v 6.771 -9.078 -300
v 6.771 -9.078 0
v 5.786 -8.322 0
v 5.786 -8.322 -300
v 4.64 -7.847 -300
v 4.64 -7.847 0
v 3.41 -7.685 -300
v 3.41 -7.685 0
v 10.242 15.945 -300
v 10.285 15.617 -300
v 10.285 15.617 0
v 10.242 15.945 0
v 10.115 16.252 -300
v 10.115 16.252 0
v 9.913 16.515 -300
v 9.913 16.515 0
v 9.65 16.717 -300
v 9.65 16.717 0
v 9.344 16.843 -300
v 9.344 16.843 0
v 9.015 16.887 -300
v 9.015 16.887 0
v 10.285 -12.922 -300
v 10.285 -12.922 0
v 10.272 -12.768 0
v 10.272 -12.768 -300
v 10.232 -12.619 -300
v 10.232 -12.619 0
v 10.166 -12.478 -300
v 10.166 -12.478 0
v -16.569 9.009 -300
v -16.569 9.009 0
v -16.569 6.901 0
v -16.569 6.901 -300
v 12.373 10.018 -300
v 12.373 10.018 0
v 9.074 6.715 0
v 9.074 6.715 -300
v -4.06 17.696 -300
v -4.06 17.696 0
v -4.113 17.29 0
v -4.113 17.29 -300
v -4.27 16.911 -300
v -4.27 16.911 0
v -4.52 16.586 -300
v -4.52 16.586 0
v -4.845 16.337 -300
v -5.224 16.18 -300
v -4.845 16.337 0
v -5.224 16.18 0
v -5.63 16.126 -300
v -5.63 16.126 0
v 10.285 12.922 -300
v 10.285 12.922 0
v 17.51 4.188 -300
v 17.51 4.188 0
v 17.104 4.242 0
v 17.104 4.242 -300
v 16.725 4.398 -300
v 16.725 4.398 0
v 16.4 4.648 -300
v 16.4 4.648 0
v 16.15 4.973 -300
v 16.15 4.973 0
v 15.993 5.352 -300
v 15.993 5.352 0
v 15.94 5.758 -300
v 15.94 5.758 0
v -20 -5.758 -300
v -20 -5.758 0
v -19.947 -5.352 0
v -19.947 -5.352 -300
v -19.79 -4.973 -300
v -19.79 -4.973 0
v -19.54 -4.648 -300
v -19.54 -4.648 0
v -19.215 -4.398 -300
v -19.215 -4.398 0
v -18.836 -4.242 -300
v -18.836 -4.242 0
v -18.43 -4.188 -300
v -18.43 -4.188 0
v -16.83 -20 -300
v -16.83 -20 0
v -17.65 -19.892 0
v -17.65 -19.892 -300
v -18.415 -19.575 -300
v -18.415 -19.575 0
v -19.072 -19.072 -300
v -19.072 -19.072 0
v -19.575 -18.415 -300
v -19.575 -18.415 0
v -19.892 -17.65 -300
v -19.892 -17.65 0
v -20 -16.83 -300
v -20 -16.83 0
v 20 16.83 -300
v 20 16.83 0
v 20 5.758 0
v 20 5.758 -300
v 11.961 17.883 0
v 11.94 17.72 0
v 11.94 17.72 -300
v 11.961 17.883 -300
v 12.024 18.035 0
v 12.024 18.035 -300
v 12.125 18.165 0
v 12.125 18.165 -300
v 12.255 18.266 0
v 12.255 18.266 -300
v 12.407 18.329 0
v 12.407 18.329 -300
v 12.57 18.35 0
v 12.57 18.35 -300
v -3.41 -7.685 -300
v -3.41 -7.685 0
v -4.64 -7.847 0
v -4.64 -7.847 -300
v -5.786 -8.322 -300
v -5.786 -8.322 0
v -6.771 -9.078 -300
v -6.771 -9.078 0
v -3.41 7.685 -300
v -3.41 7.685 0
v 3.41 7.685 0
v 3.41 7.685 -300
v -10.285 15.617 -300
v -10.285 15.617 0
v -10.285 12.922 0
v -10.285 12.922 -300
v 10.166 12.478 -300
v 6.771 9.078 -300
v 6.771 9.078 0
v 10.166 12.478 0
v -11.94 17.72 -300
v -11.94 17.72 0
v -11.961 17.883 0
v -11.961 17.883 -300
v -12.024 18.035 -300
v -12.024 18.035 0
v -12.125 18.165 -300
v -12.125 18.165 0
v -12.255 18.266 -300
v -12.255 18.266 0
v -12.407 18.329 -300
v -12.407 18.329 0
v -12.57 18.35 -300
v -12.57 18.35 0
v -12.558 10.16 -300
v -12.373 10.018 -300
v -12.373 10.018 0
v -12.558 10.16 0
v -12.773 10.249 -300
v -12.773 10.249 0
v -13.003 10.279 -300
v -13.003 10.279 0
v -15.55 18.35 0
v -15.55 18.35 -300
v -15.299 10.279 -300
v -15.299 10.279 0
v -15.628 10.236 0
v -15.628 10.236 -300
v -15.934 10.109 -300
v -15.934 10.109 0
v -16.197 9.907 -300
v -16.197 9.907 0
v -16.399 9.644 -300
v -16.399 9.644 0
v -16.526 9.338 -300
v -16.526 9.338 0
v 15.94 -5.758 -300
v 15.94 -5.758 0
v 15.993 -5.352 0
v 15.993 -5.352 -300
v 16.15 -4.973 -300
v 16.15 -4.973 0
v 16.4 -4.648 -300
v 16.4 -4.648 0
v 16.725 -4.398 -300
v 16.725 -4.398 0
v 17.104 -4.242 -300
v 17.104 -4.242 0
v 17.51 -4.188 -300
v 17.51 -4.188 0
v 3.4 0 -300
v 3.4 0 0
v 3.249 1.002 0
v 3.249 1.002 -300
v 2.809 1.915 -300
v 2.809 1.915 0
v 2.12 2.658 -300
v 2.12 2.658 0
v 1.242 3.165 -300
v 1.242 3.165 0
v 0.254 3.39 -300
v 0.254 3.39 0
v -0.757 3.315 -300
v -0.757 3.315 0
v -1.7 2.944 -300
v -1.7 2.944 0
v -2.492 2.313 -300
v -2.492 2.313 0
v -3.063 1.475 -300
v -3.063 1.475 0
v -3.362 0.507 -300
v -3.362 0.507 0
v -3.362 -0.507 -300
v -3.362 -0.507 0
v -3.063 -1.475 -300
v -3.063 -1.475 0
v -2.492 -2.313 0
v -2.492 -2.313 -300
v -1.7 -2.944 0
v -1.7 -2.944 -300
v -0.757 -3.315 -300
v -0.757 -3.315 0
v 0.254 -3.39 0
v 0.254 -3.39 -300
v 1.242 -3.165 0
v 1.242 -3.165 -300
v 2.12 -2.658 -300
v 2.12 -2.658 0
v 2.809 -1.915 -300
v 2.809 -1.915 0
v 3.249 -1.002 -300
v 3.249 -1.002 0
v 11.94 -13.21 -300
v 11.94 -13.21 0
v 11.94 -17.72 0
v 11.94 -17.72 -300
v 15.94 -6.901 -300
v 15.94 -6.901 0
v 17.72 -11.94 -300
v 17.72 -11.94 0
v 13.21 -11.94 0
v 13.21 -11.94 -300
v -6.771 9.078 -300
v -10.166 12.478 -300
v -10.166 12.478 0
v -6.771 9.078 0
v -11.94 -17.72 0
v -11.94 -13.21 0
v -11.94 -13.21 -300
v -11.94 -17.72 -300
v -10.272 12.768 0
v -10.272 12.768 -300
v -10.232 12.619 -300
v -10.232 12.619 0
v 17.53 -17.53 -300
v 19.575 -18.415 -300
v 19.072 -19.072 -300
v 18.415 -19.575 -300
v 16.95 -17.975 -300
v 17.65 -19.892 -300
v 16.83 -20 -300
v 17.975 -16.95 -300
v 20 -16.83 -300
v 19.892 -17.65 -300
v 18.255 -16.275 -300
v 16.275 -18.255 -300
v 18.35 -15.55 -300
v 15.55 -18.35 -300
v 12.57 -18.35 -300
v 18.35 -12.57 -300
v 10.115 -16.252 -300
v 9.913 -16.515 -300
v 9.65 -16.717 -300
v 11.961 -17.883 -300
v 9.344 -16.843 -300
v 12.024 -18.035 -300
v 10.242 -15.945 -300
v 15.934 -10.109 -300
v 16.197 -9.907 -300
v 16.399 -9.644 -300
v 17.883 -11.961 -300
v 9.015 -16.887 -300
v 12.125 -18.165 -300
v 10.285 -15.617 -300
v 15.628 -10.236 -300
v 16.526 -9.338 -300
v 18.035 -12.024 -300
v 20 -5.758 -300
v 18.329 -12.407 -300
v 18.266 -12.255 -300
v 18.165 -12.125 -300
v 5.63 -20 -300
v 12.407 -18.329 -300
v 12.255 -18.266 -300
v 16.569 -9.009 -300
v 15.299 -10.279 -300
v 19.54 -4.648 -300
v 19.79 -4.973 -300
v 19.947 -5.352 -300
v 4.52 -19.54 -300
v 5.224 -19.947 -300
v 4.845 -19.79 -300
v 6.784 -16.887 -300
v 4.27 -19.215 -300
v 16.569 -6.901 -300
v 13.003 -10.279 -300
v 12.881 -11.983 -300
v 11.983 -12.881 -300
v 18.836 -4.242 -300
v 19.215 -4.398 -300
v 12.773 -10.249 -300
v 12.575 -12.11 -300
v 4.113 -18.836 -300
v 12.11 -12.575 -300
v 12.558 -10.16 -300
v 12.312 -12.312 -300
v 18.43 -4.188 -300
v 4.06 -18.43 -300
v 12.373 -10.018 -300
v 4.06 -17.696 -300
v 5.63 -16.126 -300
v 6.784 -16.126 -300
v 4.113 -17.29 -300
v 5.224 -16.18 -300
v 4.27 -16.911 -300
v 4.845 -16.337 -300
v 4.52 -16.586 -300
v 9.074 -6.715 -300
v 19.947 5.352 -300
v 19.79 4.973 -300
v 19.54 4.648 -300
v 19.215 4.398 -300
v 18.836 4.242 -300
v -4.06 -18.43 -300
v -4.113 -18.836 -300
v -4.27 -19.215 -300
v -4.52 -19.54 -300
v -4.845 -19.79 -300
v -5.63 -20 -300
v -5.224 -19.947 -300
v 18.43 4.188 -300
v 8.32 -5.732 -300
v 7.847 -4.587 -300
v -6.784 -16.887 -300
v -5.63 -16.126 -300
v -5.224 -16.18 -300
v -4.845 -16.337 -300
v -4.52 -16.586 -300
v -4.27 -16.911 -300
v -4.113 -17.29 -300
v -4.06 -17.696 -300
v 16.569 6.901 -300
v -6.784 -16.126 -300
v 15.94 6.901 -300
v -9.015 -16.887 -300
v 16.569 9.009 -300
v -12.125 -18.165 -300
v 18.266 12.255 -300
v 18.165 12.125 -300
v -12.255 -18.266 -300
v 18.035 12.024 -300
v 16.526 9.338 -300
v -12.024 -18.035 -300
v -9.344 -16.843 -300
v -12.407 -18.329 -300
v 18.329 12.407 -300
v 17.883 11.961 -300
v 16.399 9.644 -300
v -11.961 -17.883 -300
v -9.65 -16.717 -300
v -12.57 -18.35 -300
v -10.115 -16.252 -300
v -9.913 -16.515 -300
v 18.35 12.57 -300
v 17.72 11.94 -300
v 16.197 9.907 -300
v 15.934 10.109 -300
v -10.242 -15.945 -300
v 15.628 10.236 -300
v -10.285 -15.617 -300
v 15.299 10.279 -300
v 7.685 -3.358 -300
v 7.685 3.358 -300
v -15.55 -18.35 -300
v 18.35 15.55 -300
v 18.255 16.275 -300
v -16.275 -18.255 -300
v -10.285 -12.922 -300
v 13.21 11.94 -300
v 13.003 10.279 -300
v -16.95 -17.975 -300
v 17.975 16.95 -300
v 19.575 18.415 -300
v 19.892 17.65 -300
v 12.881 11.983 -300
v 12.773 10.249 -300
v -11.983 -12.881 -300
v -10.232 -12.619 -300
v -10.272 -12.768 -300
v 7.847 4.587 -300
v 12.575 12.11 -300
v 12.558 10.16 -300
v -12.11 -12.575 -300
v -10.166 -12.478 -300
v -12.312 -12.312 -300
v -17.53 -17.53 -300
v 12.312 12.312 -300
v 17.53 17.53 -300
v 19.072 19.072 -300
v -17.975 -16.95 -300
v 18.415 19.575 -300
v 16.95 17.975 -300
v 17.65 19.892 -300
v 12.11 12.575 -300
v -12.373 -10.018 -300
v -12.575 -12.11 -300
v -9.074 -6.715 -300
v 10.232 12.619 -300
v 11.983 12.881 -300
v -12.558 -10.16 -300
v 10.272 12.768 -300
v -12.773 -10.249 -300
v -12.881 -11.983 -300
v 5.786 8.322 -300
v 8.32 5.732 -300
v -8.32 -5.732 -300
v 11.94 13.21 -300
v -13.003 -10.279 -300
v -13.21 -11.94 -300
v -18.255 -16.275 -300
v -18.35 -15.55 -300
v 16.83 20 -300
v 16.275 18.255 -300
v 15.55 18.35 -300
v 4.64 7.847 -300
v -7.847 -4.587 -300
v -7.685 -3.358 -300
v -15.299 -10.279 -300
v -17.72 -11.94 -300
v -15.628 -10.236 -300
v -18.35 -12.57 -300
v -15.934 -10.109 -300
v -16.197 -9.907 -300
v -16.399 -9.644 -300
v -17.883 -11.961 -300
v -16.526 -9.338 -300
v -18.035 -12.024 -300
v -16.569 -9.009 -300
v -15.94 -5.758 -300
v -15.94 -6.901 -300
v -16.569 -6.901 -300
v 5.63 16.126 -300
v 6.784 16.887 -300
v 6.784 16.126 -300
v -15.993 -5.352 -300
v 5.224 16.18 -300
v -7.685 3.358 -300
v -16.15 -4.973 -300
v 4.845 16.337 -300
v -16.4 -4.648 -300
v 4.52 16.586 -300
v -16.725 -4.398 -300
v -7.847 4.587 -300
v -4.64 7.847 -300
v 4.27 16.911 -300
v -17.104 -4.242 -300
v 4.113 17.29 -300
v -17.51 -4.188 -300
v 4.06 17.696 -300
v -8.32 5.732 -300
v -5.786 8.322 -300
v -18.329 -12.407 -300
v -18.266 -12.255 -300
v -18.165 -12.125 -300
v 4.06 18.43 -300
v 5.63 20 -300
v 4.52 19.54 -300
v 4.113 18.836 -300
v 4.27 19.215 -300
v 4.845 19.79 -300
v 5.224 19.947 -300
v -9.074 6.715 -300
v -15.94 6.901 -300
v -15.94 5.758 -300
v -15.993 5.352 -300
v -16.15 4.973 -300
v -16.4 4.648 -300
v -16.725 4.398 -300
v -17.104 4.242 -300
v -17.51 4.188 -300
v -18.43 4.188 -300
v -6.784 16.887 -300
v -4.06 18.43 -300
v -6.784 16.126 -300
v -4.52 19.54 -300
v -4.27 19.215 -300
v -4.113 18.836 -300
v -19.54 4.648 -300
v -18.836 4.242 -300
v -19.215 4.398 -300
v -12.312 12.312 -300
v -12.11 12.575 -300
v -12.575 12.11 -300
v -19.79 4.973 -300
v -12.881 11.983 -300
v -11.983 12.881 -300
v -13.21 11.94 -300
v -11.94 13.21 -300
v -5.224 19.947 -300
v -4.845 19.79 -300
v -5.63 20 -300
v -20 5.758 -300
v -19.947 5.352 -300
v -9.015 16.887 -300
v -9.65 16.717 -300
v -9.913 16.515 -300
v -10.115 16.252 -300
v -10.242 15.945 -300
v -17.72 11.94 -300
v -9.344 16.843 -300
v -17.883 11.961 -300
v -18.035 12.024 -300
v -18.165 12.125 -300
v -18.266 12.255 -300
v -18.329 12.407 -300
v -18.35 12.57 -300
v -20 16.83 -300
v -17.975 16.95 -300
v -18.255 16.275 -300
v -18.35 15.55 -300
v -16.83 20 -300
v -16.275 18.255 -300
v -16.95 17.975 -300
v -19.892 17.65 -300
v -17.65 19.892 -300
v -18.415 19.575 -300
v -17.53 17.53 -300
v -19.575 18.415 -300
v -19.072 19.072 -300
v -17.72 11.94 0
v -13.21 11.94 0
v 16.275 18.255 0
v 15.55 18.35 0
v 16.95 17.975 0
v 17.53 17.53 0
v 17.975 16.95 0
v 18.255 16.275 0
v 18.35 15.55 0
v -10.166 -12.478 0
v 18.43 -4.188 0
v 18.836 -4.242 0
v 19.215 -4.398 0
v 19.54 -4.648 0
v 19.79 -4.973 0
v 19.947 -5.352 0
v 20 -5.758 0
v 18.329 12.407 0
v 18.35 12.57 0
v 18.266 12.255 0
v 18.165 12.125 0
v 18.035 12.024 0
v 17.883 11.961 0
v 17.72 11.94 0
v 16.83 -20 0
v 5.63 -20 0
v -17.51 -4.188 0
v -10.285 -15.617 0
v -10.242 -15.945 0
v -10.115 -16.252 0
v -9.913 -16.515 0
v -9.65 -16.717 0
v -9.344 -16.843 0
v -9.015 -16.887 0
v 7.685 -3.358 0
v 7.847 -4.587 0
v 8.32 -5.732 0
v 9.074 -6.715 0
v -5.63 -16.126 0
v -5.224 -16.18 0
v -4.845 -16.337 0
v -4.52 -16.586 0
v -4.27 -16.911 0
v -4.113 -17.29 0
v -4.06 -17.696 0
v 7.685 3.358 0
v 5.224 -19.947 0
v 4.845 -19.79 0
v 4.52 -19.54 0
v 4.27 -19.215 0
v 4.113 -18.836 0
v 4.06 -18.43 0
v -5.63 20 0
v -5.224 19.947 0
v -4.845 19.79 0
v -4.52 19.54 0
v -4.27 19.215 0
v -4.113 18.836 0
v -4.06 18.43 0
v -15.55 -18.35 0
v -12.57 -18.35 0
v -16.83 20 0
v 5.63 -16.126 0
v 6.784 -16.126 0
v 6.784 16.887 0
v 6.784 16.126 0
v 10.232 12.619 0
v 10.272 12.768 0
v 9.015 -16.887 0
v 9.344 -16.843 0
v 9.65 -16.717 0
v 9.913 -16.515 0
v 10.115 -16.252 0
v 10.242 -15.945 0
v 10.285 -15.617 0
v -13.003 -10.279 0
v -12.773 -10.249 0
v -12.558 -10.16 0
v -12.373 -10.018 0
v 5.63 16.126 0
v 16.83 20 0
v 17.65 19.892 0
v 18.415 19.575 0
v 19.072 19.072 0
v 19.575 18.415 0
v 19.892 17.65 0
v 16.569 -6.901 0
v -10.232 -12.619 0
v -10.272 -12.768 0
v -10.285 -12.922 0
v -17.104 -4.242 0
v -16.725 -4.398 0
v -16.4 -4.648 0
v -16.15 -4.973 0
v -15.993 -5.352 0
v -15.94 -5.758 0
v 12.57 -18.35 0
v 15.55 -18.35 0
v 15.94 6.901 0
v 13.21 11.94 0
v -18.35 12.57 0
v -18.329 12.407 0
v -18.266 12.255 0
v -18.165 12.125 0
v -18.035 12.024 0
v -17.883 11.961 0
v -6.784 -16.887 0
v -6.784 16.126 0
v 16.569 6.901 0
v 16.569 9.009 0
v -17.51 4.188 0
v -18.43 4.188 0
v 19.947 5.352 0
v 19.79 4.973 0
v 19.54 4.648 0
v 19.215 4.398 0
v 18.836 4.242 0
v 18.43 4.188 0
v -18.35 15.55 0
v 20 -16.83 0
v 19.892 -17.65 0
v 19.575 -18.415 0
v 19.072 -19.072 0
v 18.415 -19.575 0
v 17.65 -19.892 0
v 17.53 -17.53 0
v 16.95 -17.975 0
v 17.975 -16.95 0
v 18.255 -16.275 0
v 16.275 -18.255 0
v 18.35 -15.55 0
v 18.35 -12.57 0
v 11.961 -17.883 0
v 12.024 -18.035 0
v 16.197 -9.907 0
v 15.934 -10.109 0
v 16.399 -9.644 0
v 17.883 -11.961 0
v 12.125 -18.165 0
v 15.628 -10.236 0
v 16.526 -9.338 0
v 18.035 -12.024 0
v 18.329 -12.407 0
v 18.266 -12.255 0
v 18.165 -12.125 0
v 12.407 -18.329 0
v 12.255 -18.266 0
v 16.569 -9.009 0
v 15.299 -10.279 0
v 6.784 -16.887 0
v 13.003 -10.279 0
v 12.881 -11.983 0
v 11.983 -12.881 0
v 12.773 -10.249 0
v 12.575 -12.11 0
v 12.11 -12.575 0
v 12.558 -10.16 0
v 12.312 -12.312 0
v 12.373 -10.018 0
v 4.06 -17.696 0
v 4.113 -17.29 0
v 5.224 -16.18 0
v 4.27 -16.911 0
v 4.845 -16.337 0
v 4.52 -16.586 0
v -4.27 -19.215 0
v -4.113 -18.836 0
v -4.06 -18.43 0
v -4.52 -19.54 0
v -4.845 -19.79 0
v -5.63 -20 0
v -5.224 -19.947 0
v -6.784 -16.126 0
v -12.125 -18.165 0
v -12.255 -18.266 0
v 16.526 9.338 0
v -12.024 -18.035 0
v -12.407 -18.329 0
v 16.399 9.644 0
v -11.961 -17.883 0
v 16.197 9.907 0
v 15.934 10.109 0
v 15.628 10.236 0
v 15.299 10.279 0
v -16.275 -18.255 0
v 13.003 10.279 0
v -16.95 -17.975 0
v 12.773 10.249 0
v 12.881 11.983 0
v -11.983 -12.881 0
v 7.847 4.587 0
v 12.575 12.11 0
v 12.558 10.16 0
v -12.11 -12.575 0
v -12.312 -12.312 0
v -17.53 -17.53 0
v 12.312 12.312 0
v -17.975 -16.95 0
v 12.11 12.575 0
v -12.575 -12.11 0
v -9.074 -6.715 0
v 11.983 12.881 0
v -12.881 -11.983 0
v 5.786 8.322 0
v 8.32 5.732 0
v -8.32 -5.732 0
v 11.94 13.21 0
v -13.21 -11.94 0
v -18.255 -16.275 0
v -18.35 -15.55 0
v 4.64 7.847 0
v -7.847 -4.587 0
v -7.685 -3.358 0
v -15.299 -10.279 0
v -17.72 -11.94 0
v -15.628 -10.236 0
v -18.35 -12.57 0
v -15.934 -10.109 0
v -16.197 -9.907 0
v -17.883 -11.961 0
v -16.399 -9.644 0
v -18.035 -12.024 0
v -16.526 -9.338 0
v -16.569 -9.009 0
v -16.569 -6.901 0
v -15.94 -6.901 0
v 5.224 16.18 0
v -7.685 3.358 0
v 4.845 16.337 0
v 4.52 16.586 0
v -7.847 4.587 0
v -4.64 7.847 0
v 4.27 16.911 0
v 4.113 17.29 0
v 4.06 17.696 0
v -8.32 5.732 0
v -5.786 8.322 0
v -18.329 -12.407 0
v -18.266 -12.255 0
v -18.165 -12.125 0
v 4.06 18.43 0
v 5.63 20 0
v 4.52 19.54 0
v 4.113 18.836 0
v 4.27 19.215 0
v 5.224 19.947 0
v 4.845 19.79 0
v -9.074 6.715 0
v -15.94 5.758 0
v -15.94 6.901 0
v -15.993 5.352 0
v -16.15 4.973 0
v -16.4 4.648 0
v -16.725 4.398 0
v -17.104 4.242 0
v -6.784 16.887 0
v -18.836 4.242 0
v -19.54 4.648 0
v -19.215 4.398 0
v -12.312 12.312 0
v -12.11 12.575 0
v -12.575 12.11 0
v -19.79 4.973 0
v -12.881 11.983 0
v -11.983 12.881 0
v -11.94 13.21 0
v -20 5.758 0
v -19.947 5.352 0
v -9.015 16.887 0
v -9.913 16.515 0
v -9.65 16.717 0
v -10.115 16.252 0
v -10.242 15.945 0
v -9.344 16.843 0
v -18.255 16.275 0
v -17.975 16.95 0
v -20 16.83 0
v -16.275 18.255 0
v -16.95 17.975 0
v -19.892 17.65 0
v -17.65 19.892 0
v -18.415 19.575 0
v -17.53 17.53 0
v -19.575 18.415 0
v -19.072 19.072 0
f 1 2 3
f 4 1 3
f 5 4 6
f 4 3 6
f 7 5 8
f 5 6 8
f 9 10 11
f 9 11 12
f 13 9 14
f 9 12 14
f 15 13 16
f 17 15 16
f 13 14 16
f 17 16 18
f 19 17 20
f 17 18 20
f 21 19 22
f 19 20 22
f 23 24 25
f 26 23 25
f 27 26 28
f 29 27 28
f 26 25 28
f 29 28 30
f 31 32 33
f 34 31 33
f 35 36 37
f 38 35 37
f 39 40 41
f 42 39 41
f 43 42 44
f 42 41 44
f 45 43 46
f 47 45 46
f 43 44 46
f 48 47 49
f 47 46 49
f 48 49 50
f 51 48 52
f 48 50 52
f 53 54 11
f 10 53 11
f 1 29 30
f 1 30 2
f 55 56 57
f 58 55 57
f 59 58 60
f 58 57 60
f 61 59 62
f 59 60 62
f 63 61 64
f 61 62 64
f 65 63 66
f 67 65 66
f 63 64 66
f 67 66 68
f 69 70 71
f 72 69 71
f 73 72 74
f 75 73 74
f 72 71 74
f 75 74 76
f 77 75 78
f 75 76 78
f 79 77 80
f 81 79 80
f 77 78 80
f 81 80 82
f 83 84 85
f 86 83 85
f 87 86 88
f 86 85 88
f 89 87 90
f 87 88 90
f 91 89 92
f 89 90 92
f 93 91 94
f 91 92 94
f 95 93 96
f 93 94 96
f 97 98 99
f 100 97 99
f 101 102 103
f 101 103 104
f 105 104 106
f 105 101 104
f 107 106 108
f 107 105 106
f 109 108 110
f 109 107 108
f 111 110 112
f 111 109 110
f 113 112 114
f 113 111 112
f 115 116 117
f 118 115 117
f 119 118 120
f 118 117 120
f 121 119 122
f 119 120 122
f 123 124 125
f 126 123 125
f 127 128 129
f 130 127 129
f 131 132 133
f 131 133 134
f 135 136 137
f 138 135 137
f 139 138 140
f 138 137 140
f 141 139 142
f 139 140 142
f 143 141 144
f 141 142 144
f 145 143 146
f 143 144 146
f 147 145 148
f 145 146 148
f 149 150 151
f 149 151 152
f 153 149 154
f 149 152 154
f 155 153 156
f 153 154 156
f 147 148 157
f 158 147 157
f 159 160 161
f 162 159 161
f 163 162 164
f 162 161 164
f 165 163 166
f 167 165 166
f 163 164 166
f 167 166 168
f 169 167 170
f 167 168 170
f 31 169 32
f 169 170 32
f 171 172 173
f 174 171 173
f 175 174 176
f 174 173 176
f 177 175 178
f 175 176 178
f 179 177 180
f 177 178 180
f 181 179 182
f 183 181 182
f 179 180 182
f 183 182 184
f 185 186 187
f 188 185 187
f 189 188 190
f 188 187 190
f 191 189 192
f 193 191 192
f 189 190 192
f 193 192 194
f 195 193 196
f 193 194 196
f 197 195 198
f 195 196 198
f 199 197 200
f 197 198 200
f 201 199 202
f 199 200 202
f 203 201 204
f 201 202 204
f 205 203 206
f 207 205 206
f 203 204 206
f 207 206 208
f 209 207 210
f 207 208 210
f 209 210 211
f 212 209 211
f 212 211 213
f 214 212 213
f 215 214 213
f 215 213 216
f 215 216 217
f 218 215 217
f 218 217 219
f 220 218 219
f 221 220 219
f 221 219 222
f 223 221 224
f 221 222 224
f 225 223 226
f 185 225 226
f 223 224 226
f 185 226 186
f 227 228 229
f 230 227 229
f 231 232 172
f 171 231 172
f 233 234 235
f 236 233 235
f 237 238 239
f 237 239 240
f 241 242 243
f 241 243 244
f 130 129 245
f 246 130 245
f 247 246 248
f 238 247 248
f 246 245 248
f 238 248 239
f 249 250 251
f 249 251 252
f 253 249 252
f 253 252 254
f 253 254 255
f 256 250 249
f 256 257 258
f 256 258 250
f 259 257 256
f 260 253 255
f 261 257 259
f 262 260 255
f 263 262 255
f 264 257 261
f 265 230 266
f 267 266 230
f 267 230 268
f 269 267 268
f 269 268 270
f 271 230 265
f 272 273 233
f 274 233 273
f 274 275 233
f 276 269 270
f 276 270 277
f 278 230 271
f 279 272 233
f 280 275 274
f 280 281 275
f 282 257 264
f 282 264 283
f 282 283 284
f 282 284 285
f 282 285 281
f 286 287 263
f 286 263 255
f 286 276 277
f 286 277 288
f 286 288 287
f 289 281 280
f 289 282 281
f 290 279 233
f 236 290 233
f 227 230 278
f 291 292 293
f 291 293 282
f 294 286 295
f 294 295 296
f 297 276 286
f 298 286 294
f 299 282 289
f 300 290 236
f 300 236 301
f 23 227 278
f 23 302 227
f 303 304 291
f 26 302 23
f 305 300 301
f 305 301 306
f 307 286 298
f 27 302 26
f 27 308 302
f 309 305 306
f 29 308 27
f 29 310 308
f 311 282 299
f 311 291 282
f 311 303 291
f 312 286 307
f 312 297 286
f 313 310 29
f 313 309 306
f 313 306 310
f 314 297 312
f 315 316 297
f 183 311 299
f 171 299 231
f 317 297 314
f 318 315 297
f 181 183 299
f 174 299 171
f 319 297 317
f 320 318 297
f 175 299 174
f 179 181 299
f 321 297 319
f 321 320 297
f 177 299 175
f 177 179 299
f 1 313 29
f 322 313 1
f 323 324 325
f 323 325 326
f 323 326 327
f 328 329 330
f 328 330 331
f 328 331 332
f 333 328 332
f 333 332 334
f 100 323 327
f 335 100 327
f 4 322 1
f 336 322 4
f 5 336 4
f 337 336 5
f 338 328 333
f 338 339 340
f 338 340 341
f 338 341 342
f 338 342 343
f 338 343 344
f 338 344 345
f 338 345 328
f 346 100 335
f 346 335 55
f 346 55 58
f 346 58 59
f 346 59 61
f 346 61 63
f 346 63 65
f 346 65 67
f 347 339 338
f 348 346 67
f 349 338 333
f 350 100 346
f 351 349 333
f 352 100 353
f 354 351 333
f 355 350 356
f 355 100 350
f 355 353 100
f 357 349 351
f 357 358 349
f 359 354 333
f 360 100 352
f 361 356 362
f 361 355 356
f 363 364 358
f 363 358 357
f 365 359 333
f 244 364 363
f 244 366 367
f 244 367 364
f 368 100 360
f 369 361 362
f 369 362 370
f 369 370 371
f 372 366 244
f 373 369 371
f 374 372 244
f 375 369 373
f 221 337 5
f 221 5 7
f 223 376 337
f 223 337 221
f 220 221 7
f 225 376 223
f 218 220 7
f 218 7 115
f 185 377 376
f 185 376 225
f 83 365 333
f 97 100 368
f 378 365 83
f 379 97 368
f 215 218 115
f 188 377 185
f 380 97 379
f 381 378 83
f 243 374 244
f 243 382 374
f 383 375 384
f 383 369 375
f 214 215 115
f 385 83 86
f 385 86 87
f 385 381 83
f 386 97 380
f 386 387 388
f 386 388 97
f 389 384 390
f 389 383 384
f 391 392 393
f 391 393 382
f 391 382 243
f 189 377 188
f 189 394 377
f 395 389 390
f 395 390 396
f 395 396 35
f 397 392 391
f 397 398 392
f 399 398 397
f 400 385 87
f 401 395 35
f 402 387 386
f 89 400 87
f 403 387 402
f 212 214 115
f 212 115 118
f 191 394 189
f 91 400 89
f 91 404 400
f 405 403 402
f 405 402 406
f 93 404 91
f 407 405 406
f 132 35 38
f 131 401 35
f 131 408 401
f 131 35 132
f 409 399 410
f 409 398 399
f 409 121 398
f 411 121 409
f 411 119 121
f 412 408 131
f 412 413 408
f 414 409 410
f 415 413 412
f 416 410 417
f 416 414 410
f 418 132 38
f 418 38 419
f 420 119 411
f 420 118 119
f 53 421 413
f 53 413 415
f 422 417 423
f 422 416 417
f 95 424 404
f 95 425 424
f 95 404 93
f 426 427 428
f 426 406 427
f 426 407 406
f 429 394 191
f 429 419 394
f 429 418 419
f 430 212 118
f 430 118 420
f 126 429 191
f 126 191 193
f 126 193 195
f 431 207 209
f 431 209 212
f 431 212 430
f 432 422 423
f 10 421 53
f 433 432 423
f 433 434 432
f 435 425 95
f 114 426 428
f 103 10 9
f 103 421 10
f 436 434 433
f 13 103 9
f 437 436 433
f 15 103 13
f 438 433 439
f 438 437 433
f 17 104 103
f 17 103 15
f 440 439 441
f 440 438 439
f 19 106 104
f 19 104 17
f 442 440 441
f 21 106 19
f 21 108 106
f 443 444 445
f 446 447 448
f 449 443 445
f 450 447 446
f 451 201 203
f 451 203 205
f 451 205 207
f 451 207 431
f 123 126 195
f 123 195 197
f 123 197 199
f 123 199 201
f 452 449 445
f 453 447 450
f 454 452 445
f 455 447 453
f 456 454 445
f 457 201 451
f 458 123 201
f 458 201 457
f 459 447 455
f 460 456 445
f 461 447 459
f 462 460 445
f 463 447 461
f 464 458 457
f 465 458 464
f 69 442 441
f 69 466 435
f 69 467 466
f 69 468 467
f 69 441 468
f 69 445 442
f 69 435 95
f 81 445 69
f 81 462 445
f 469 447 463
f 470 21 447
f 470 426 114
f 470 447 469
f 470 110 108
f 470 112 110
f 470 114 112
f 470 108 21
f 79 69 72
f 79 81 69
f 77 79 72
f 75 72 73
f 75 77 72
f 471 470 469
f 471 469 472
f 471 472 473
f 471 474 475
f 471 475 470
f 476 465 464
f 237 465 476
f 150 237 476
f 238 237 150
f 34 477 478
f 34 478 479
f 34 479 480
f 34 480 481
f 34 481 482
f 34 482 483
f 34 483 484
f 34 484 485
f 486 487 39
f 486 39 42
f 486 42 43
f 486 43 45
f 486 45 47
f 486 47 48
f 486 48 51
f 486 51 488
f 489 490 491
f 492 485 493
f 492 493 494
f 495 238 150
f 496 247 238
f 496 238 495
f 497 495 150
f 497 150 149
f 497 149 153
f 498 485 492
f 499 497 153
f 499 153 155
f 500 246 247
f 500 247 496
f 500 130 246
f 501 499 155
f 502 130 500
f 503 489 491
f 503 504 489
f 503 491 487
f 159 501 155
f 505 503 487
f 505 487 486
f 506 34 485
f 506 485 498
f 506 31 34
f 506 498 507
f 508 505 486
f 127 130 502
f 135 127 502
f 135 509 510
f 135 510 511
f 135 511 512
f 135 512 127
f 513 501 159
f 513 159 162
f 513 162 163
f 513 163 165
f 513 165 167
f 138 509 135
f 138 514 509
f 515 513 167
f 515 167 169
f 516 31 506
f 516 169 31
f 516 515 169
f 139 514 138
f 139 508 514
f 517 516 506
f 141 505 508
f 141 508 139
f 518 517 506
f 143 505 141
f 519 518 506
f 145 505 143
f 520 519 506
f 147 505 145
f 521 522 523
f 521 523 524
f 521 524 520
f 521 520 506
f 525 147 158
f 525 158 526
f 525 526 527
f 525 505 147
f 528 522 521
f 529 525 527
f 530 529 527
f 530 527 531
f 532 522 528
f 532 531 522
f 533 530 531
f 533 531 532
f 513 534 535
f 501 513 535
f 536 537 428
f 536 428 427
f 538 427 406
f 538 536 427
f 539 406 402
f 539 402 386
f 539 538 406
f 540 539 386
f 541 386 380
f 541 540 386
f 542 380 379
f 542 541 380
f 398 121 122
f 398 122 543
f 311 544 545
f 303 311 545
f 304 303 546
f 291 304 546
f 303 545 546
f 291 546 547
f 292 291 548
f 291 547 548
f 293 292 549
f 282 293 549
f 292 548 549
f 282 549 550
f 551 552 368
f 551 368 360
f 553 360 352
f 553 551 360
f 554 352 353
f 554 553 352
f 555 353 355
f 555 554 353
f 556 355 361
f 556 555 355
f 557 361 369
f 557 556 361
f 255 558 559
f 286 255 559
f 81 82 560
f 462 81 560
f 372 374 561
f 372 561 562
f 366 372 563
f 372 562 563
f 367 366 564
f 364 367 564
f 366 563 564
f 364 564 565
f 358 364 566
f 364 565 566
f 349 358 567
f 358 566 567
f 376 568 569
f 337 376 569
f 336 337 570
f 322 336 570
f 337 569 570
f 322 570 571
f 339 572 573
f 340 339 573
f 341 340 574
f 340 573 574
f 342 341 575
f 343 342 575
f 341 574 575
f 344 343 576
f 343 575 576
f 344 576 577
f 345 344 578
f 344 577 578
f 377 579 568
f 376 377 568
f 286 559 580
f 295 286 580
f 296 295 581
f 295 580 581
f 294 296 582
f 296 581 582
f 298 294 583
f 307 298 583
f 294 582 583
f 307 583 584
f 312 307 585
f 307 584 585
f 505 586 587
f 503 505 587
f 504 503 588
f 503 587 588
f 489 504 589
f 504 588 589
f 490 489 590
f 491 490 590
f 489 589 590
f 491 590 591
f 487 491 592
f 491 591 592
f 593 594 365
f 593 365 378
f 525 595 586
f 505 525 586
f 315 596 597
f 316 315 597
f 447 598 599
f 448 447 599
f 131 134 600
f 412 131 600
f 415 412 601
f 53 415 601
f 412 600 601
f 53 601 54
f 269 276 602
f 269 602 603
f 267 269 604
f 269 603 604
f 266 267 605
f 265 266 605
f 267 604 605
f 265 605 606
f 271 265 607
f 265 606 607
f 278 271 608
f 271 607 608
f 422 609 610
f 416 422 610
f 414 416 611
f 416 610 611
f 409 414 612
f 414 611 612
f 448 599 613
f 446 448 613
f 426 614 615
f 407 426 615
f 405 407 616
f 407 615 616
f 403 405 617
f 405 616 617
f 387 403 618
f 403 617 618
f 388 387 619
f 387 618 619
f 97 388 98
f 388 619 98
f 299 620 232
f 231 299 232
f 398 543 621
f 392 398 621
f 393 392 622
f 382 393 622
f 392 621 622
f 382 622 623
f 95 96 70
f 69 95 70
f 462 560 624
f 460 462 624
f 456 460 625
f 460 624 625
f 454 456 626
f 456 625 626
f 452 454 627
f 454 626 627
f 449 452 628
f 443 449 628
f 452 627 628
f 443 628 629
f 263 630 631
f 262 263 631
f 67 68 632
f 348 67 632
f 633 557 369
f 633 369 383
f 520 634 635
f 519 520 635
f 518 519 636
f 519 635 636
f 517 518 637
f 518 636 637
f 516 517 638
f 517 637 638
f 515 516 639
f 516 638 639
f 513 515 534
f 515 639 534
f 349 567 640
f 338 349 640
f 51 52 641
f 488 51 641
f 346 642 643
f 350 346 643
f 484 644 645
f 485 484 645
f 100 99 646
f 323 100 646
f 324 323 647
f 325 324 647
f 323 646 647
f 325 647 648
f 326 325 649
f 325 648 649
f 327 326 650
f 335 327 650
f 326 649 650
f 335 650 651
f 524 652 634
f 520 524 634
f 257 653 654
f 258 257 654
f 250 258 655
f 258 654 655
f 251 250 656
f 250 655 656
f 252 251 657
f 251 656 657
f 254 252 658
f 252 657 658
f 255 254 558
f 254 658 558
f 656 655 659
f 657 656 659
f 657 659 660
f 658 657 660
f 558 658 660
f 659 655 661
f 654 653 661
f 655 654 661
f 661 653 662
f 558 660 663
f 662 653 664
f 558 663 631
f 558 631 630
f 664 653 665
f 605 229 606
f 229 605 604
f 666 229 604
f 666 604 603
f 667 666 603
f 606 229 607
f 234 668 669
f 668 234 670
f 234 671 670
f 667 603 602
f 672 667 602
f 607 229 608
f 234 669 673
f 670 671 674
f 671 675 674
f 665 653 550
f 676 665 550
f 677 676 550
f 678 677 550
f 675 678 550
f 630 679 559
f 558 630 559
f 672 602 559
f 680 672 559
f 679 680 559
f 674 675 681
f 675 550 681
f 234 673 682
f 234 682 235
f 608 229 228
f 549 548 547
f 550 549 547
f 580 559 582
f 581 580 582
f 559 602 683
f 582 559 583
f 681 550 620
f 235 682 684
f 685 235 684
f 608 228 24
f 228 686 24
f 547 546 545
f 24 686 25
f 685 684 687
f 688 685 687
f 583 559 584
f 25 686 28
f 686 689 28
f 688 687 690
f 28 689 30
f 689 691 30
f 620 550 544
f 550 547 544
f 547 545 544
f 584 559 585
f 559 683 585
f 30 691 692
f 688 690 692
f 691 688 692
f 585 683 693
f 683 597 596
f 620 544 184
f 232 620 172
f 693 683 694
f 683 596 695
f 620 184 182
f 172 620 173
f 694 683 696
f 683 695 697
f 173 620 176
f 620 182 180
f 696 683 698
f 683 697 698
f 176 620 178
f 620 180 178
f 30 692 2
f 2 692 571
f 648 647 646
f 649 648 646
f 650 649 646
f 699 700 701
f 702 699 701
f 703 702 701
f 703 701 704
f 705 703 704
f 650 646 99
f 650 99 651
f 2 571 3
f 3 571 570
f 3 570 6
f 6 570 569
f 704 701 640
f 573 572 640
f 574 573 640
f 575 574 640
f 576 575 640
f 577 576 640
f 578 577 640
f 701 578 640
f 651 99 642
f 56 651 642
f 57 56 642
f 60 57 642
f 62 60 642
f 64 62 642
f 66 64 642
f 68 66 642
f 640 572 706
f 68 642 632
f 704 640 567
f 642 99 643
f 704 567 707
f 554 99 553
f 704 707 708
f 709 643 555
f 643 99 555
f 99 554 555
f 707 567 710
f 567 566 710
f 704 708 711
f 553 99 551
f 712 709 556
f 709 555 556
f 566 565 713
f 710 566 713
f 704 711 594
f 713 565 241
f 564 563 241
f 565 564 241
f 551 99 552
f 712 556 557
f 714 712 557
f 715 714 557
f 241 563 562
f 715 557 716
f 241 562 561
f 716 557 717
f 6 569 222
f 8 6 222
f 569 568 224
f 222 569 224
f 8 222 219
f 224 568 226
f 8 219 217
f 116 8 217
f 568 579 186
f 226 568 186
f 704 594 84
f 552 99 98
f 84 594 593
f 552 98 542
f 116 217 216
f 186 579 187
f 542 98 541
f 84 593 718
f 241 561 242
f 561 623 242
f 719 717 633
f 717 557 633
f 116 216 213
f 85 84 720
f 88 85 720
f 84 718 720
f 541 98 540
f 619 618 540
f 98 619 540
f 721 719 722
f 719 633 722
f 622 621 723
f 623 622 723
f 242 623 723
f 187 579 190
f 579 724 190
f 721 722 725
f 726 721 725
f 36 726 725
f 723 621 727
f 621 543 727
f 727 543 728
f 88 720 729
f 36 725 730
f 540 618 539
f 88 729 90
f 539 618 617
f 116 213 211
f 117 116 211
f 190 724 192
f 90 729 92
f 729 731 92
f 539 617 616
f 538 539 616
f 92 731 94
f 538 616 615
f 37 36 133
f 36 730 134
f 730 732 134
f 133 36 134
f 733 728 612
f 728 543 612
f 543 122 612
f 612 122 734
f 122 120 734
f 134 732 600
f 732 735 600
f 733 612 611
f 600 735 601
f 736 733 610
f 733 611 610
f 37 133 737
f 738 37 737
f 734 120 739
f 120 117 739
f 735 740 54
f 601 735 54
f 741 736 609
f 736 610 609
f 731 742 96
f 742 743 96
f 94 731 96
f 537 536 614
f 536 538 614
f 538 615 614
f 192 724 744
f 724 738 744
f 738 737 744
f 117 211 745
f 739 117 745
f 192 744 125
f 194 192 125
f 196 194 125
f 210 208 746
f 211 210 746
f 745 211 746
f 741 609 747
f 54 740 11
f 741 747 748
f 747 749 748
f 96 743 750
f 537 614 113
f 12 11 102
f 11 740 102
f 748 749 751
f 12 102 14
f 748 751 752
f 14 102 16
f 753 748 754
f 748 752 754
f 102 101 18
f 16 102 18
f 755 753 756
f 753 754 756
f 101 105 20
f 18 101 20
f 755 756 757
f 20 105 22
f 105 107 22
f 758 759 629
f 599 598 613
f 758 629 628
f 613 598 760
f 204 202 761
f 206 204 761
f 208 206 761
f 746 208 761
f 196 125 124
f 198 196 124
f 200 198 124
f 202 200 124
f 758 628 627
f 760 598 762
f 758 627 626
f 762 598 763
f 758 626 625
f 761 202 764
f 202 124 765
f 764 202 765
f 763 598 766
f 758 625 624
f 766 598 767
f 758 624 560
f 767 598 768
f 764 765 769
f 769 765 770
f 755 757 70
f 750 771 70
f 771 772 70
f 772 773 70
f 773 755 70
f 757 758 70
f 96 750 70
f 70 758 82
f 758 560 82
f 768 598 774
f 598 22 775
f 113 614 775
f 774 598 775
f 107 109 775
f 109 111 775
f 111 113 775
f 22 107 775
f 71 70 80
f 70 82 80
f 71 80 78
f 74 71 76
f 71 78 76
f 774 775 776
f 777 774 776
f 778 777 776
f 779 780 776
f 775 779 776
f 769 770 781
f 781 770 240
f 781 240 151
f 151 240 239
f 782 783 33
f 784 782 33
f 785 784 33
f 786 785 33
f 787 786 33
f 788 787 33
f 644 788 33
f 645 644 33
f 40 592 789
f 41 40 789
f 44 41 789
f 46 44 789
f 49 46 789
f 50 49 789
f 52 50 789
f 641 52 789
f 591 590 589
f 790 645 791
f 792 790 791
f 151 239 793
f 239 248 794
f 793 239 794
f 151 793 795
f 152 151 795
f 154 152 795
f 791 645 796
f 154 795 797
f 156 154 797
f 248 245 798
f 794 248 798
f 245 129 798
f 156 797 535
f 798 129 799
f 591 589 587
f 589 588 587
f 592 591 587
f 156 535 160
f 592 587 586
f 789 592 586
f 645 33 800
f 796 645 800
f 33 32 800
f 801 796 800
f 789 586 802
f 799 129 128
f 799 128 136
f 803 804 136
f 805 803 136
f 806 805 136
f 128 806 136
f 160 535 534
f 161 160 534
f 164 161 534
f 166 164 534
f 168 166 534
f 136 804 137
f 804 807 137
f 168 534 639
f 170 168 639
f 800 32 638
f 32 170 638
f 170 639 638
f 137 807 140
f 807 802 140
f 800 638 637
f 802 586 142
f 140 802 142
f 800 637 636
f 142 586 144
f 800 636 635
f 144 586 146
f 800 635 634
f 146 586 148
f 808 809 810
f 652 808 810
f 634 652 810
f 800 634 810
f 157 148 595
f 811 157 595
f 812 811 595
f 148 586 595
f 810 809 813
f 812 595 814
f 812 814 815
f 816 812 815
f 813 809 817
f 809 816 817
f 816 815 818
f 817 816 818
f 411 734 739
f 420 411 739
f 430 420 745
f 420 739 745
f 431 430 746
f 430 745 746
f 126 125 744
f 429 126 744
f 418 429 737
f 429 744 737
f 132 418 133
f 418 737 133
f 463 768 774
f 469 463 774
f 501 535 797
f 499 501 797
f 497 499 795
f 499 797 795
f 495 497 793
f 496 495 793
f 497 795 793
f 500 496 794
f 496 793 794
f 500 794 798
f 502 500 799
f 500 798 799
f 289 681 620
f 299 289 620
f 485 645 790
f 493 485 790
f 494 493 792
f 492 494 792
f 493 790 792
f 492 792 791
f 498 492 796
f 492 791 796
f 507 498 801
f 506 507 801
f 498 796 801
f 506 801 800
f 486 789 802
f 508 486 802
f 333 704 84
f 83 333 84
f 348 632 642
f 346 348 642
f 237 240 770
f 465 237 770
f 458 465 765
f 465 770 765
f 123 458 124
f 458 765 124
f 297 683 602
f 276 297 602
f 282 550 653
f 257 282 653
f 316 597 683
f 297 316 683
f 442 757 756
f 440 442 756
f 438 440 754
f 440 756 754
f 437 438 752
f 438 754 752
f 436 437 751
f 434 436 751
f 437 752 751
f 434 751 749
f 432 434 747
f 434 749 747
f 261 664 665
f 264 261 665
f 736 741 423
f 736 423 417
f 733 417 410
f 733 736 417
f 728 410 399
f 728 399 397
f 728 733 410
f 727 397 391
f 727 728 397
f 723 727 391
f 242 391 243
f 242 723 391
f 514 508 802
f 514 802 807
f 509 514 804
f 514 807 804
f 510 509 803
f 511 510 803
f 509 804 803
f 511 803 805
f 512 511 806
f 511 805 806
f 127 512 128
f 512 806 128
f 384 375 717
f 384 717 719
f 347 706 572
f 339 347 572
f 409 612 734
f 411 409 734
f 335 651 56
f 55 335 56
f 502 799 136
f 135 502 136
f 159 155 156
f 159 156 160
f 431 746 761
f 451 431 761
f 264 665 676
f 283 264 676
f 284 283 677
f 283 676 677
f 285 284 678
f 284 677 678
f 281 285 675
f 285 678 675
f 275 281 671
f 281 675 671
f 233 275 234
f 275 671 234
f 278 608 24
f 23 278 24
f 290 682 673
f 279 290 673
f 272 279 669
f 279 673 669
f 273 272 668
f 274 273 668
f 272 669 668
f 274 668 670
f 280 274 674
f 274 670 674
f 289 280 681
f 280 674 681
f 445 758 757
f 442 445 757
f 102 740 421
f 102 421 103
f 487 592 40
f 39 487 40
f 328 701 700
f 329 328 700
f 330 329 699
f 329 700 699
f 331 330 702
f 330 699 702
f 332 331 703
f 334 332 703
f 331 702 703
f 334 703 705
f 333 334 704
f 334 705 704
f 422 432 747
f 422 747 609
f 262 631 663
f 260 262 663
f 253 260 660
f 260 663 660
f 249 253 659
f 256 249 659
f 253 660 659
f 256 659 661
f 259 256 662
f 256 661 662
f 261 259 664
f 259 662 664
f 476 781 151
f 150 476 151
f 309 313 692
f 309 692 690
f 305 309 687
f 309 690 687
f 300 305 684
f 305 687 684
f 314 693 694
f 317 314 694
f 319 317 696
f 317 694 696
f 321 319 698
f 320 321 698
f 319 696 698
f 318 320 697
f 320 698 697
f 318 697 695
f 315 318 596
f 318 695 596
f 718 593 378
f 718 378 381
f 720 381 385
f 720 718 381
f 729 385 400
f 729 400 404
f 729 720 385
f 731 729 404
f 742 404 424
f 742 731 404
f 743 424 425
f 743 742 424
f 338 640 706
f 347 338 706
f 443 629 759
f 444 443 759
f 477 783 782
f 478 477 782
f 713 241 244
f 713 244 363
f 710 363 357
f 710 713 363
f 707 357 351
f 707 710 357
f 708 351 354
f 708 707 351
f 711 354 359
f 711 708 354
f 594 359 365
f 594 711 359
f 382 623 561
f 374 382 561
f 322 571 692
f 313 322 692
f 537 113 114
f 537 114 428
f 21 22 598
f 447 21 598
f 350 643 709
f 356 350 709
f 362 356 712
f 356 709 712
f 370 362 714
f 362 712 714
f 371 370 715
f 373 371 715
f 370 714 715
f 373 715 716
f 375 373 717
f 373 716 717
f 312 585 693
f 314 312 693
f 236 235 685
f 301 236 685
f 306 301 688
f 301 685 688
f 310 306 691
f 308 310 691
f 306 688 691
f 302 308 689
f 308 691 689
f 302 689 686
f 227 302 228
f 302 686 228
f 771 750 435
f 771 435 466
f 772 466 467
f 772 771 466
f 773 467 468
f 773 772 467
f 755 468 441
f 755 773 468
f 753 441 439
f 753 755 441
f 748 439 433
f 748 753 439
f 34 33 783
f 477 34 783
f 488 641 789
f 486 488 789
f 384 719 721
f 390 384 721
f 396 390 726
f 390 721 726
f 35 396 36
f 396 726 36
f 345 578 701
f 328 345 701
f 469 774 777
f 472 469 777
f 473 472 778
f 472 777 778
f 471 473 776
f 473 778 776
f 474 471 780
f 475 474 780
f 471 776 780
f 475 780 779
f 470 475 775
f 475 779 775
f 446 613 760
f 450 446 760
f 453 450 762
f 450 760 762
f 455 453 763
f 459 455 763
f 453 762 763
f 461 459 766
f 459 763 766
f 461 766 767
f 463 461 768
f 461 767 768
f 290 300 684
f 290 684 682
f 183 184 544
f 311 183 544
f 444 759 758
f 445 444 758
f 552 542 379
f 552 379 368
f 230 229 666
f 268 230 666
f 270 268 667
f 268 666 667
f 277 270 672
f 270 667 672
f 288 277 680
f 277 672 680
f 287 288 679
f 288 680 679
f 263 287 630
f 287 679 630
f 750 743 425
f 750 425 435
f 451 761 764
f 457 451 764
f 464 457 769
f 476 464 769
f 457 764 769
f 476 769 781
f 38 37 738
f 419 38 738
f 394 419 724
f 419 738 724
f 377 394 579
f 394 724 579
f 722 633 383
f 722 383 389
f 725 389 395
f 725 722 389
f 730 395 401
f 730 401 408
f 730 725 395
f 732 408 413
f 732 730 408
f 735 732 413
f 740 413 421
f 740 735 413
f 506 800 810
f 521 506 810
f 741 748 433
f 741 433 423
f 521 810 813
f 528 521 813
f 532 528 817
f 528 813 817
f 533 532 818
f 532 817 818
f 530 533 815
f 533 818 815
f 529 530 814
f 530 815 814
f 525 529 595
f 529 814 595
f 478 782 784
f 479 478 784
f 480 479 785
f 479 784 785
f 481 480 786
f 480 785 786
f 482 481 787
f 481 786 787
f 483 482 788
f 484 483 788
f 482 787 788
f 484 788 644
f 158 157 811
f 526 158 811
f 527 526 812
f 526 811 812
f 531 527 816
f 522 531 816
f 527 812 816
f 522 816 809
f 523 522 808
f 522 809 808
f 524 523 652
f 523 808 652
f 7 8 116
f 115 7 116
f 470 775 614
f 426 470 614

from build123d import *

# Parameters (mm, degrees)
SKETCH1_R      = 3.4
EXTRUDE1_DEPTH = 300


with BuildPart() as part:
    # Sketch1 → Extrude1 (new body)
    with BuildSketch(Plane.XY):
        with BuildLine():
            Line((7.685, 3.358241745), (7.685, -3.358241745))
            ThreePointArc((7.685, -3.358241745), (8.046005845, -5.174620093), (9.074149602, -6.714904463))
            Line((9.074149602, -6.714904463), (12.373454754, -10.018325737))
            ThreePointArc((12.373454754, -10.018325737), (12.662327453, -10.211539726), (13.003171987, -10.279393143))
            Line((13.003171987, -10.279393143), (15.298849809, -10.279393143))
            ThreePointArc((15.298849809, -10.279393143), (16.196875422, -9.907418755), (16.568849809, -9.009393143))
            Line((16.568849809, -9.009393143), (16.568849809, -6.901425905))
            Line((16.568849809, -6.901425905), (15.94, -6.901425905))
            Line((15.94, -6.901425905), (15.94, -5.758104362))
            ThreePointArc((15.94, -5.758104362), (16.399842354, -4.647946715), (17.51, -4.188104362))
            Line((17.51, -4.188104362), (18.43, -4.188104362))
            ThreePointArc((18.43, -4.188104362), (19.540157646, -4.647946715), (20, -5.758104362))
            Line((20, -5.758104362), (20, -13.186220555))
            Line((20, -13.186220555), (20, -16.83))
            ThreePointArc((20, -16.83), (19.071528496, -19.071528496), (16.83, -20))
            Line((16.83, -20), (13.004526429, -20))
            Line((13.004526429, -20), (5.63, -20))
            ThreePointArc((5.63, -20), (4.519842354, -19.540157646), (4.06, -18.43))
            Line((4.06, -18.43), (4.06, -17.696220555))
            ThreePointArc((4.06, -17.696220555), (4.519842354, -16.586062909), (5.63, -16.126220555))
            Line((5.63, -16.126220555), (6.7839284, -16.126220555))
            Line((6.7839284, -16.126220555), (6.7839284, -16.886683809))
            Line((6.7839284, -16.886683809), (9.015, -16.886683809))
            ThreePointArc((9.015, -16.886683809), (9.913025612, -16.514709421), (10.285, -15.616683809))
            Line((10.285, -15.616683809), (10.285, -12.922193682))
            ThreePointArc((10.285, -12.922193682), (10.254851172, -12.69250702), (10.166447275, -12.47838167))
            Line((10.166447275, -12.47838167), (6.770639403, -9.078337282))
            ThreePointArc((6.770639403, -9.078337282), (5.228903087, -8.047139023), (3.409789005, -7.685))
            Line((3.409789005, -7.685), (-3.409789005, -7.685))
            ThreePointArc((-3.409789005, -7.685), (-5.228903087, -8.047139023), (-6.770639403, -9.078337282))
            Line((-6.770639403, -9.078337282), (-10.166447275, -12.47838167))
            ThreePointArc((-10.166447275, -12.47838167), (-10.254851172, -12.69250702), (-10.285, -12.922193682))
            Line((-10.285, -12.922193682), (-10.285, -15.616683809))
            ThreePointArc((-10.285, -15.616683809), (-9.913025612, -16.514709421), (-9.015, -16.886683809))
            Line((-9.015, -16.886683809), (-6.7839284, -16.886683809))
            Line((-6.7839284, -16.886683809), (-6.7839284, -16.126220555))
            Line((-6.7839284, -16.126220555), (-5.63, -16.126220555))
            ThreePointArc((-5.63, -16.126220555), (-4.519842354, -16.586062909), (-4.06, -17.696220555))
            Line((-4.06, -17.696220555), (-4.06, -18.43))
            ThreePointArc((-4.06, -18.43), (-4.519842354, -19.540157646), (-5.63, -20))
            Line((-5.63, -20), (-13.004526429, -20))
            Line((-13.004526429, -20), (-16.83, -20))
            ThreePointArc((-16.83, -20), (-19.071528496, -19.071528496), (-20, -16.83))
            Line((-20, -16.83), (-20, -13.186220555))
            Line((-20, -13.186220555), (-20, -5.758104362))
            ThreePointArc((-20, -5.758104362), (-19.540157646, -4.647946715), (-18.43, -4.188104362))
            Line((-18.43, -4.188104362), (-17.51, -4.188104362))
            ThreePointArc((-17.51, -4.188104362), (-16.399842354, -4.647946715), (-15.94, -5.758104362))
            Line((-15.94, -5.758104362), (-15.94, -6.901425905))
            Line((-15.94, -6.901425905), (-16.568849809, -6.901425905))
            Line((-16.568849809, -6.901425905), (-16.568849809, -9.009393143))
            ThreePointArc((-16.568849809, -9.009393143), (-16.196875422, -9.907418755), (-15.298849809, -10.279393143))
            Line((-15.298849809, -10.279393143), (-13.003171987, -10.279393143))
            ThreePointArc((-13.003171987, -10.279393143), (-12.662327453, -10.211539726), (-12.373454754, -10.018325737))
            Line((-12.373454754, -10.018325737), (-9.074149602, -6.714904463))
            ThreePointArc((-9.074149602, -6.714904463), (-8.046005845, -5.174620093), (-7.685, -3.358241745))
            Line((-7.685, -3.358241745), (-7.685, 3.358241745))
            ThreePointArc((-7.685, 3.358241745), (-8.046005845, 5.174620093), (-9.074149602, 6.714904463))
            Line((-9.074149602, 6.714904463), (-12.373454754, 10.018325737))
            ThreePointArc((-12.373454754, 10.018325737), (-12.662327453, 10.211539726), (-13.003171987, 10.279393143))
            Line((-13.003171987, 10.279393143), (-15.298849809, 10.279393143))
            ThreePointArc((-15.298849809, 10.279393143), (-16.196875422, 9.907418755), (-16.568849809, 9.009393143))
            Line((-16.568849809, 9.009393143), (-16.568849809, 6.901425905))
            Line((-16.568849809, 6.901425905), (-15.94, 6.901425905))
            Line((-15.94, 6.901425905), (-15.94, 5.758104362))
            ThreePointArc((-15.94, 5.758104362), (-16.399842354, 4.647946715), (-17.51, 4.188104362))
            Line((-17.51, 4.188104362), (-18.43, 4.188104362))
            ThreePointArc((-18.43, 4.188104362), (-19.540157646, 4.647946715), (-20, 5.758104362))
            Line((-20, 5.758104362), (-20, 13.186220555))
            Line((-20, 13.186220555), (-20, 16.83))
            ThreePointArc((-20, 16.83), (-19.071528496, 19.071528496), (-16.83, 20))
            Line((-16.83, 20), (-13.004526429, 20))
            Line((-13.004526429, 20), (-5.63, 20))
            ThreePointArc((-5.63, 20), (-4.519842354, 19.540157646), (-4.06, 18.43))
            Line((-4.06, 18.43), (-4.06, 17.696220555))
            ThreePointArc((-4.06, 17.696220555), (-4.519842354, 16.586062909), (-5.63, 16.126220555))
            Line((-5.63, 16.126220555), (-6.7839284, 16.126220555))
            Line((-6.7839284, 16.126220555), (-6.7839284, 16.886683809))
            Line((-6.7839284, 16.886683809), (-9.015, 16.886683809))
            ThreePointArc((-9.015, 16.886683809), (-9.913025612, 16.514709421), (-10.285, 15.616683809))
            Line((-10.285, 15.616683809), (-10.285, 12.922193682))
            ThreePointArc((-10.285, 12.922193682), (-10.254851172, 12.69250702), (-10.166447275, 12.47838167))
            Line((-10.166447275, 12.47838167), (-6.770639403, 9.078337282))
            ThreePointArc((-6.770639403, 9.078337282), (-5.228903087, 8.047139023), (-3.409789005, 7.685))
            Line((-3.409789005, 7.685), (3.409789005, 7.685))
            ThreePointArc((3.409789005, 7.685), (5.228903087, 8.047139023), (6.770639403, 9.078337282))
            Line((6.770639403, 9.078337282), (10.166447275, 12.47838167))
            ThreePointArc((10.166447275, 12.47838167), (10.254851172, 12.69250702), (10.285, 12.922193682))
            Line((10.285, 12.922193682), (10.285, 15.616683809))
            ThreePointArc((10.285, 15.616683809), (9.913025612, 16.514709421), (9.015, 16.886683809))
            Line((9.015, 16.886683809), (6.7839284, 16.886683809))
            Line((6.7839284, 16.886683809), (6.7839284, 16.126220555))
            Line((6.7839284, 16.126220555), (5.63, 16.126220555))
            ThreePointArc((5.63, 16.126220555), (4.519842354, 16.586062909), (4.06, 17.696220555))
            Line((4.06, 17.696220555), (4.06, 18.43))
            ThreePointArc((4.06, 18.43), (4.519842354, 19.540157646), (5.63, 20))
            Line((5.63, 20), (13.004526429, 20))
            Line((13.004526429, 20), (16.83, 20))
            ThreePointArc((16.83, 20), (19.071528496, 19.071528496), (20, 16.83))
            Line((20, 16.83), (20, 13.186220555))
            Line((20, 13.186220555), (20, 5.758104362))
            ThreePointArc((20, 5.758104362), (19.540157646, 4.647946715), (18.43, 4.188104362))
            Line((18.43, 4.188104362), (17.51, 4.188104362))
            ThreePointArc((17.51, 4.188104362), (16.399842354, 4.647946715), (15.94, 5.758104362))
            Line((15.94, 5.758104362), (15.94, 6.901425905))
            Line((15.94, 6.901425905), (16.568849809, 6.901425905))
            Line((16.568849809, 6.901425905), (16.568849809, 9.009393143))
            ThreePointArc((16.568849809, 9.009393143), (16.196875422, 9.907418755), (15.298849809, 10.279393143))
            Line((15.298849809, 10.279393143), (13.003171987, 10.279393143))
            ThreePointArc((13.003171987, 10.279393143), (12.662327453, 10.211539726), (12.373454754, 10.018325737))
            Line((12.373454754, 10.018325737), (9.074149602, 6.714904463))
            ThreePointArc((9.074149602, 6.714904463), (8.046005845, 5.174620093), (7.685, 3.358241745))
        make_face()
        Circle(SKETCH1_R, mode=Mode.SUBTRACT)
        with BuildLine():
            Line((12.57, 18.35), (15.55, 18.35))
            ThreePointArc((15.55, 18.35), (17.529898987, 17.529898987), (18.35, 15.55))
            Line((18.35, 15.55), (18.35, 12.57))
            ThreePointArc((18.35, 12.57), (18.165477272, 12.124522728), (17.72, 11.94))
            Line((17.72, 11.94), (13.21, 11.94))
            ThreePointArc((13.21, 11.94), (12.311974388, 12.311974388), (11.94, 13.21))
            Line((11.94, 13.21), (11.94, 17.72))
            ThreePointArc((11.94, 17.72), (12.124522728, 18.165477272), (12.57, 18.35))
        make_face(mode=Mode.SUBTRACT)
        with BuildLine():
            Line((-12.57, -18.35), (-15.55, -18.35))
            ThreePointArc((-15.55, -18.35), (-17.529898987, -17.529898987), (-18.35, -15.55))
            Line((-18.35, -15.55), (-18.35, -12.57))
            ThreePointArc((-18.35, -12.57), (-18.165477272, -12.124522728), (-17.72, -11.94))
            Line((-17.72, -11.94), (-13.21, -11.94))
            ThreePointArc((-13.21, -11.94), (-12.311974388, -12.311974388), (-11.94, -13.21))
            Line((-11.94, -13.21), (-11.94, -17.72))
            ThreePointArc((-11.94, -17.72), (-12.124522728, -18.165477272), (-12.57, -18.35))
        make_face(mode=Mode.SUBTRACT)
        with BuildLine():
            Line((18.35, -15.55), (18.35, -12.57))
            ThreePointArc((18.35, -12.57), (18.165477272, -12.124522728), (17.72, -11.94))
            Line((17.72, -11.94), (13.21, -11.94))
            ThreePointArc((13.21, -11.94), (12.311974388, -12.311974388), (11.94, -13.21))
            Line((11.94, -13.21), (11.94, -17.72))
            ThreePointArc((11.94, -17.72), (12.124522728, -18.165477272), (12.57, -18.35))
            Line((12.57, -18.35), (15.55, -18.35))
            ThreePointArc((15.55, -18.35), (17.529898987, -17.529898987), (18.35, -15.55))
        make_face(mode=Mode.SUBTRACT)
        with BuildLine():
            Line((-18.35, 15.55), (-18.35, 12.57))
            ThreePointArc((-18.35, 12.57), (-18.165477272, 12.124522728), (-17.72, 11.94))
            Line((-17.72, 11.94), (-13.21, 11.94))
            ThreePointArc((-13.21, 11.94), (-12.311974388, 12.311974388), (-11.94, 13.21))
            Line((-11.94, 13.21), (-11.94, 17.72))
            ThreePointArc((-11.94, 17.72), (-12.124522728, 18.165477272), (-12.57, 18.35))
            Line((-12.57, 18.35), (-15.55, 18.35))
            ThreePointArc((-15.55, 18.35), (-17.529898987, 17.529898987), (-18.35, 15.55))
        make_face(mode=Mode.SUBTRACT)
    extrude(amount=-EXTRUDE1_DEPTH)


solid = part.part
